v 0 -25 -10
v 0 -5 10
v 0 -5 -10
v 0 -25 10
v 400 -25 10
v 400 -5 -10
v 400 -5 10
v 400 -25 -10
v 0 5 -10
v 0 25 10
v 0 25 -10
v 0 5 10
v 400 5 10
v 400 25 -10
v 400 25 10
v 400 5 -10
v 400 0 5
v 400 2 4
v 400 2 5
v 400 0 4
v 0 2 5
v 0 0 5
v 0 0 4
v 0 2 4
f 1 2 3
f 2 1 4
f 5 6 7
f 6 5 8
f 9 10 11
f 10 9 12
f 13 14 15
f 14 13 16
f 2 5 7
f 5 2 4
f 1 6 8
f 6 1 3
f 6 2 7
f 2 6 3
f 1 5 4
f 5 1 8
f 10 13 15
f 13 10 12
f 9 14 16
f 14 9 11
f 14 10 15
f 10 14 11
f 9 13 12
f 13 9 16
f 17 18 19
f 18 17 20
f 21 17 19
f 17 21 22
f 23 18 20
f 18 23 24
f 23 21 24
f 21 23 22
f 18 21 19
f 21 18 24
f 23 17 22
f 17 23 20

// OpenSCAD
module assembly_preview() {
  rod_d = 8.0;
  rod_spacing = 40.0;
  rod_len = 400.0;
  
  module rods(){
    color([0.7,0.7,0.7]) {
      translate([0, -rod_spacing/2, 0]) rotate([0,90,0]) cylinder(h=rod_len, d=rod_d, center=false);
      translate([0,  rod_spacing/2, 0]) rotate([0,90,0]) cylinder(h=rod_len, d=rod_d, center=false);
    }
  }
  rods();
  color([0.3,0.3,0.3]) translate([0, -25, -10]) cube([rod_len, 20, 20], center=false);
  color([0.3,0.3,0.3]) translate([0,  5, -10]) cube([rod_len, 20, 20], center=false);
  color([0.1,0.1,0.1]) translate([0,0,rod_d/2]) cube([rod_len, 2, 1], center=false);
  // Import and position printable parts manually if you want a full assembly preview.
}
assembly_preview();
